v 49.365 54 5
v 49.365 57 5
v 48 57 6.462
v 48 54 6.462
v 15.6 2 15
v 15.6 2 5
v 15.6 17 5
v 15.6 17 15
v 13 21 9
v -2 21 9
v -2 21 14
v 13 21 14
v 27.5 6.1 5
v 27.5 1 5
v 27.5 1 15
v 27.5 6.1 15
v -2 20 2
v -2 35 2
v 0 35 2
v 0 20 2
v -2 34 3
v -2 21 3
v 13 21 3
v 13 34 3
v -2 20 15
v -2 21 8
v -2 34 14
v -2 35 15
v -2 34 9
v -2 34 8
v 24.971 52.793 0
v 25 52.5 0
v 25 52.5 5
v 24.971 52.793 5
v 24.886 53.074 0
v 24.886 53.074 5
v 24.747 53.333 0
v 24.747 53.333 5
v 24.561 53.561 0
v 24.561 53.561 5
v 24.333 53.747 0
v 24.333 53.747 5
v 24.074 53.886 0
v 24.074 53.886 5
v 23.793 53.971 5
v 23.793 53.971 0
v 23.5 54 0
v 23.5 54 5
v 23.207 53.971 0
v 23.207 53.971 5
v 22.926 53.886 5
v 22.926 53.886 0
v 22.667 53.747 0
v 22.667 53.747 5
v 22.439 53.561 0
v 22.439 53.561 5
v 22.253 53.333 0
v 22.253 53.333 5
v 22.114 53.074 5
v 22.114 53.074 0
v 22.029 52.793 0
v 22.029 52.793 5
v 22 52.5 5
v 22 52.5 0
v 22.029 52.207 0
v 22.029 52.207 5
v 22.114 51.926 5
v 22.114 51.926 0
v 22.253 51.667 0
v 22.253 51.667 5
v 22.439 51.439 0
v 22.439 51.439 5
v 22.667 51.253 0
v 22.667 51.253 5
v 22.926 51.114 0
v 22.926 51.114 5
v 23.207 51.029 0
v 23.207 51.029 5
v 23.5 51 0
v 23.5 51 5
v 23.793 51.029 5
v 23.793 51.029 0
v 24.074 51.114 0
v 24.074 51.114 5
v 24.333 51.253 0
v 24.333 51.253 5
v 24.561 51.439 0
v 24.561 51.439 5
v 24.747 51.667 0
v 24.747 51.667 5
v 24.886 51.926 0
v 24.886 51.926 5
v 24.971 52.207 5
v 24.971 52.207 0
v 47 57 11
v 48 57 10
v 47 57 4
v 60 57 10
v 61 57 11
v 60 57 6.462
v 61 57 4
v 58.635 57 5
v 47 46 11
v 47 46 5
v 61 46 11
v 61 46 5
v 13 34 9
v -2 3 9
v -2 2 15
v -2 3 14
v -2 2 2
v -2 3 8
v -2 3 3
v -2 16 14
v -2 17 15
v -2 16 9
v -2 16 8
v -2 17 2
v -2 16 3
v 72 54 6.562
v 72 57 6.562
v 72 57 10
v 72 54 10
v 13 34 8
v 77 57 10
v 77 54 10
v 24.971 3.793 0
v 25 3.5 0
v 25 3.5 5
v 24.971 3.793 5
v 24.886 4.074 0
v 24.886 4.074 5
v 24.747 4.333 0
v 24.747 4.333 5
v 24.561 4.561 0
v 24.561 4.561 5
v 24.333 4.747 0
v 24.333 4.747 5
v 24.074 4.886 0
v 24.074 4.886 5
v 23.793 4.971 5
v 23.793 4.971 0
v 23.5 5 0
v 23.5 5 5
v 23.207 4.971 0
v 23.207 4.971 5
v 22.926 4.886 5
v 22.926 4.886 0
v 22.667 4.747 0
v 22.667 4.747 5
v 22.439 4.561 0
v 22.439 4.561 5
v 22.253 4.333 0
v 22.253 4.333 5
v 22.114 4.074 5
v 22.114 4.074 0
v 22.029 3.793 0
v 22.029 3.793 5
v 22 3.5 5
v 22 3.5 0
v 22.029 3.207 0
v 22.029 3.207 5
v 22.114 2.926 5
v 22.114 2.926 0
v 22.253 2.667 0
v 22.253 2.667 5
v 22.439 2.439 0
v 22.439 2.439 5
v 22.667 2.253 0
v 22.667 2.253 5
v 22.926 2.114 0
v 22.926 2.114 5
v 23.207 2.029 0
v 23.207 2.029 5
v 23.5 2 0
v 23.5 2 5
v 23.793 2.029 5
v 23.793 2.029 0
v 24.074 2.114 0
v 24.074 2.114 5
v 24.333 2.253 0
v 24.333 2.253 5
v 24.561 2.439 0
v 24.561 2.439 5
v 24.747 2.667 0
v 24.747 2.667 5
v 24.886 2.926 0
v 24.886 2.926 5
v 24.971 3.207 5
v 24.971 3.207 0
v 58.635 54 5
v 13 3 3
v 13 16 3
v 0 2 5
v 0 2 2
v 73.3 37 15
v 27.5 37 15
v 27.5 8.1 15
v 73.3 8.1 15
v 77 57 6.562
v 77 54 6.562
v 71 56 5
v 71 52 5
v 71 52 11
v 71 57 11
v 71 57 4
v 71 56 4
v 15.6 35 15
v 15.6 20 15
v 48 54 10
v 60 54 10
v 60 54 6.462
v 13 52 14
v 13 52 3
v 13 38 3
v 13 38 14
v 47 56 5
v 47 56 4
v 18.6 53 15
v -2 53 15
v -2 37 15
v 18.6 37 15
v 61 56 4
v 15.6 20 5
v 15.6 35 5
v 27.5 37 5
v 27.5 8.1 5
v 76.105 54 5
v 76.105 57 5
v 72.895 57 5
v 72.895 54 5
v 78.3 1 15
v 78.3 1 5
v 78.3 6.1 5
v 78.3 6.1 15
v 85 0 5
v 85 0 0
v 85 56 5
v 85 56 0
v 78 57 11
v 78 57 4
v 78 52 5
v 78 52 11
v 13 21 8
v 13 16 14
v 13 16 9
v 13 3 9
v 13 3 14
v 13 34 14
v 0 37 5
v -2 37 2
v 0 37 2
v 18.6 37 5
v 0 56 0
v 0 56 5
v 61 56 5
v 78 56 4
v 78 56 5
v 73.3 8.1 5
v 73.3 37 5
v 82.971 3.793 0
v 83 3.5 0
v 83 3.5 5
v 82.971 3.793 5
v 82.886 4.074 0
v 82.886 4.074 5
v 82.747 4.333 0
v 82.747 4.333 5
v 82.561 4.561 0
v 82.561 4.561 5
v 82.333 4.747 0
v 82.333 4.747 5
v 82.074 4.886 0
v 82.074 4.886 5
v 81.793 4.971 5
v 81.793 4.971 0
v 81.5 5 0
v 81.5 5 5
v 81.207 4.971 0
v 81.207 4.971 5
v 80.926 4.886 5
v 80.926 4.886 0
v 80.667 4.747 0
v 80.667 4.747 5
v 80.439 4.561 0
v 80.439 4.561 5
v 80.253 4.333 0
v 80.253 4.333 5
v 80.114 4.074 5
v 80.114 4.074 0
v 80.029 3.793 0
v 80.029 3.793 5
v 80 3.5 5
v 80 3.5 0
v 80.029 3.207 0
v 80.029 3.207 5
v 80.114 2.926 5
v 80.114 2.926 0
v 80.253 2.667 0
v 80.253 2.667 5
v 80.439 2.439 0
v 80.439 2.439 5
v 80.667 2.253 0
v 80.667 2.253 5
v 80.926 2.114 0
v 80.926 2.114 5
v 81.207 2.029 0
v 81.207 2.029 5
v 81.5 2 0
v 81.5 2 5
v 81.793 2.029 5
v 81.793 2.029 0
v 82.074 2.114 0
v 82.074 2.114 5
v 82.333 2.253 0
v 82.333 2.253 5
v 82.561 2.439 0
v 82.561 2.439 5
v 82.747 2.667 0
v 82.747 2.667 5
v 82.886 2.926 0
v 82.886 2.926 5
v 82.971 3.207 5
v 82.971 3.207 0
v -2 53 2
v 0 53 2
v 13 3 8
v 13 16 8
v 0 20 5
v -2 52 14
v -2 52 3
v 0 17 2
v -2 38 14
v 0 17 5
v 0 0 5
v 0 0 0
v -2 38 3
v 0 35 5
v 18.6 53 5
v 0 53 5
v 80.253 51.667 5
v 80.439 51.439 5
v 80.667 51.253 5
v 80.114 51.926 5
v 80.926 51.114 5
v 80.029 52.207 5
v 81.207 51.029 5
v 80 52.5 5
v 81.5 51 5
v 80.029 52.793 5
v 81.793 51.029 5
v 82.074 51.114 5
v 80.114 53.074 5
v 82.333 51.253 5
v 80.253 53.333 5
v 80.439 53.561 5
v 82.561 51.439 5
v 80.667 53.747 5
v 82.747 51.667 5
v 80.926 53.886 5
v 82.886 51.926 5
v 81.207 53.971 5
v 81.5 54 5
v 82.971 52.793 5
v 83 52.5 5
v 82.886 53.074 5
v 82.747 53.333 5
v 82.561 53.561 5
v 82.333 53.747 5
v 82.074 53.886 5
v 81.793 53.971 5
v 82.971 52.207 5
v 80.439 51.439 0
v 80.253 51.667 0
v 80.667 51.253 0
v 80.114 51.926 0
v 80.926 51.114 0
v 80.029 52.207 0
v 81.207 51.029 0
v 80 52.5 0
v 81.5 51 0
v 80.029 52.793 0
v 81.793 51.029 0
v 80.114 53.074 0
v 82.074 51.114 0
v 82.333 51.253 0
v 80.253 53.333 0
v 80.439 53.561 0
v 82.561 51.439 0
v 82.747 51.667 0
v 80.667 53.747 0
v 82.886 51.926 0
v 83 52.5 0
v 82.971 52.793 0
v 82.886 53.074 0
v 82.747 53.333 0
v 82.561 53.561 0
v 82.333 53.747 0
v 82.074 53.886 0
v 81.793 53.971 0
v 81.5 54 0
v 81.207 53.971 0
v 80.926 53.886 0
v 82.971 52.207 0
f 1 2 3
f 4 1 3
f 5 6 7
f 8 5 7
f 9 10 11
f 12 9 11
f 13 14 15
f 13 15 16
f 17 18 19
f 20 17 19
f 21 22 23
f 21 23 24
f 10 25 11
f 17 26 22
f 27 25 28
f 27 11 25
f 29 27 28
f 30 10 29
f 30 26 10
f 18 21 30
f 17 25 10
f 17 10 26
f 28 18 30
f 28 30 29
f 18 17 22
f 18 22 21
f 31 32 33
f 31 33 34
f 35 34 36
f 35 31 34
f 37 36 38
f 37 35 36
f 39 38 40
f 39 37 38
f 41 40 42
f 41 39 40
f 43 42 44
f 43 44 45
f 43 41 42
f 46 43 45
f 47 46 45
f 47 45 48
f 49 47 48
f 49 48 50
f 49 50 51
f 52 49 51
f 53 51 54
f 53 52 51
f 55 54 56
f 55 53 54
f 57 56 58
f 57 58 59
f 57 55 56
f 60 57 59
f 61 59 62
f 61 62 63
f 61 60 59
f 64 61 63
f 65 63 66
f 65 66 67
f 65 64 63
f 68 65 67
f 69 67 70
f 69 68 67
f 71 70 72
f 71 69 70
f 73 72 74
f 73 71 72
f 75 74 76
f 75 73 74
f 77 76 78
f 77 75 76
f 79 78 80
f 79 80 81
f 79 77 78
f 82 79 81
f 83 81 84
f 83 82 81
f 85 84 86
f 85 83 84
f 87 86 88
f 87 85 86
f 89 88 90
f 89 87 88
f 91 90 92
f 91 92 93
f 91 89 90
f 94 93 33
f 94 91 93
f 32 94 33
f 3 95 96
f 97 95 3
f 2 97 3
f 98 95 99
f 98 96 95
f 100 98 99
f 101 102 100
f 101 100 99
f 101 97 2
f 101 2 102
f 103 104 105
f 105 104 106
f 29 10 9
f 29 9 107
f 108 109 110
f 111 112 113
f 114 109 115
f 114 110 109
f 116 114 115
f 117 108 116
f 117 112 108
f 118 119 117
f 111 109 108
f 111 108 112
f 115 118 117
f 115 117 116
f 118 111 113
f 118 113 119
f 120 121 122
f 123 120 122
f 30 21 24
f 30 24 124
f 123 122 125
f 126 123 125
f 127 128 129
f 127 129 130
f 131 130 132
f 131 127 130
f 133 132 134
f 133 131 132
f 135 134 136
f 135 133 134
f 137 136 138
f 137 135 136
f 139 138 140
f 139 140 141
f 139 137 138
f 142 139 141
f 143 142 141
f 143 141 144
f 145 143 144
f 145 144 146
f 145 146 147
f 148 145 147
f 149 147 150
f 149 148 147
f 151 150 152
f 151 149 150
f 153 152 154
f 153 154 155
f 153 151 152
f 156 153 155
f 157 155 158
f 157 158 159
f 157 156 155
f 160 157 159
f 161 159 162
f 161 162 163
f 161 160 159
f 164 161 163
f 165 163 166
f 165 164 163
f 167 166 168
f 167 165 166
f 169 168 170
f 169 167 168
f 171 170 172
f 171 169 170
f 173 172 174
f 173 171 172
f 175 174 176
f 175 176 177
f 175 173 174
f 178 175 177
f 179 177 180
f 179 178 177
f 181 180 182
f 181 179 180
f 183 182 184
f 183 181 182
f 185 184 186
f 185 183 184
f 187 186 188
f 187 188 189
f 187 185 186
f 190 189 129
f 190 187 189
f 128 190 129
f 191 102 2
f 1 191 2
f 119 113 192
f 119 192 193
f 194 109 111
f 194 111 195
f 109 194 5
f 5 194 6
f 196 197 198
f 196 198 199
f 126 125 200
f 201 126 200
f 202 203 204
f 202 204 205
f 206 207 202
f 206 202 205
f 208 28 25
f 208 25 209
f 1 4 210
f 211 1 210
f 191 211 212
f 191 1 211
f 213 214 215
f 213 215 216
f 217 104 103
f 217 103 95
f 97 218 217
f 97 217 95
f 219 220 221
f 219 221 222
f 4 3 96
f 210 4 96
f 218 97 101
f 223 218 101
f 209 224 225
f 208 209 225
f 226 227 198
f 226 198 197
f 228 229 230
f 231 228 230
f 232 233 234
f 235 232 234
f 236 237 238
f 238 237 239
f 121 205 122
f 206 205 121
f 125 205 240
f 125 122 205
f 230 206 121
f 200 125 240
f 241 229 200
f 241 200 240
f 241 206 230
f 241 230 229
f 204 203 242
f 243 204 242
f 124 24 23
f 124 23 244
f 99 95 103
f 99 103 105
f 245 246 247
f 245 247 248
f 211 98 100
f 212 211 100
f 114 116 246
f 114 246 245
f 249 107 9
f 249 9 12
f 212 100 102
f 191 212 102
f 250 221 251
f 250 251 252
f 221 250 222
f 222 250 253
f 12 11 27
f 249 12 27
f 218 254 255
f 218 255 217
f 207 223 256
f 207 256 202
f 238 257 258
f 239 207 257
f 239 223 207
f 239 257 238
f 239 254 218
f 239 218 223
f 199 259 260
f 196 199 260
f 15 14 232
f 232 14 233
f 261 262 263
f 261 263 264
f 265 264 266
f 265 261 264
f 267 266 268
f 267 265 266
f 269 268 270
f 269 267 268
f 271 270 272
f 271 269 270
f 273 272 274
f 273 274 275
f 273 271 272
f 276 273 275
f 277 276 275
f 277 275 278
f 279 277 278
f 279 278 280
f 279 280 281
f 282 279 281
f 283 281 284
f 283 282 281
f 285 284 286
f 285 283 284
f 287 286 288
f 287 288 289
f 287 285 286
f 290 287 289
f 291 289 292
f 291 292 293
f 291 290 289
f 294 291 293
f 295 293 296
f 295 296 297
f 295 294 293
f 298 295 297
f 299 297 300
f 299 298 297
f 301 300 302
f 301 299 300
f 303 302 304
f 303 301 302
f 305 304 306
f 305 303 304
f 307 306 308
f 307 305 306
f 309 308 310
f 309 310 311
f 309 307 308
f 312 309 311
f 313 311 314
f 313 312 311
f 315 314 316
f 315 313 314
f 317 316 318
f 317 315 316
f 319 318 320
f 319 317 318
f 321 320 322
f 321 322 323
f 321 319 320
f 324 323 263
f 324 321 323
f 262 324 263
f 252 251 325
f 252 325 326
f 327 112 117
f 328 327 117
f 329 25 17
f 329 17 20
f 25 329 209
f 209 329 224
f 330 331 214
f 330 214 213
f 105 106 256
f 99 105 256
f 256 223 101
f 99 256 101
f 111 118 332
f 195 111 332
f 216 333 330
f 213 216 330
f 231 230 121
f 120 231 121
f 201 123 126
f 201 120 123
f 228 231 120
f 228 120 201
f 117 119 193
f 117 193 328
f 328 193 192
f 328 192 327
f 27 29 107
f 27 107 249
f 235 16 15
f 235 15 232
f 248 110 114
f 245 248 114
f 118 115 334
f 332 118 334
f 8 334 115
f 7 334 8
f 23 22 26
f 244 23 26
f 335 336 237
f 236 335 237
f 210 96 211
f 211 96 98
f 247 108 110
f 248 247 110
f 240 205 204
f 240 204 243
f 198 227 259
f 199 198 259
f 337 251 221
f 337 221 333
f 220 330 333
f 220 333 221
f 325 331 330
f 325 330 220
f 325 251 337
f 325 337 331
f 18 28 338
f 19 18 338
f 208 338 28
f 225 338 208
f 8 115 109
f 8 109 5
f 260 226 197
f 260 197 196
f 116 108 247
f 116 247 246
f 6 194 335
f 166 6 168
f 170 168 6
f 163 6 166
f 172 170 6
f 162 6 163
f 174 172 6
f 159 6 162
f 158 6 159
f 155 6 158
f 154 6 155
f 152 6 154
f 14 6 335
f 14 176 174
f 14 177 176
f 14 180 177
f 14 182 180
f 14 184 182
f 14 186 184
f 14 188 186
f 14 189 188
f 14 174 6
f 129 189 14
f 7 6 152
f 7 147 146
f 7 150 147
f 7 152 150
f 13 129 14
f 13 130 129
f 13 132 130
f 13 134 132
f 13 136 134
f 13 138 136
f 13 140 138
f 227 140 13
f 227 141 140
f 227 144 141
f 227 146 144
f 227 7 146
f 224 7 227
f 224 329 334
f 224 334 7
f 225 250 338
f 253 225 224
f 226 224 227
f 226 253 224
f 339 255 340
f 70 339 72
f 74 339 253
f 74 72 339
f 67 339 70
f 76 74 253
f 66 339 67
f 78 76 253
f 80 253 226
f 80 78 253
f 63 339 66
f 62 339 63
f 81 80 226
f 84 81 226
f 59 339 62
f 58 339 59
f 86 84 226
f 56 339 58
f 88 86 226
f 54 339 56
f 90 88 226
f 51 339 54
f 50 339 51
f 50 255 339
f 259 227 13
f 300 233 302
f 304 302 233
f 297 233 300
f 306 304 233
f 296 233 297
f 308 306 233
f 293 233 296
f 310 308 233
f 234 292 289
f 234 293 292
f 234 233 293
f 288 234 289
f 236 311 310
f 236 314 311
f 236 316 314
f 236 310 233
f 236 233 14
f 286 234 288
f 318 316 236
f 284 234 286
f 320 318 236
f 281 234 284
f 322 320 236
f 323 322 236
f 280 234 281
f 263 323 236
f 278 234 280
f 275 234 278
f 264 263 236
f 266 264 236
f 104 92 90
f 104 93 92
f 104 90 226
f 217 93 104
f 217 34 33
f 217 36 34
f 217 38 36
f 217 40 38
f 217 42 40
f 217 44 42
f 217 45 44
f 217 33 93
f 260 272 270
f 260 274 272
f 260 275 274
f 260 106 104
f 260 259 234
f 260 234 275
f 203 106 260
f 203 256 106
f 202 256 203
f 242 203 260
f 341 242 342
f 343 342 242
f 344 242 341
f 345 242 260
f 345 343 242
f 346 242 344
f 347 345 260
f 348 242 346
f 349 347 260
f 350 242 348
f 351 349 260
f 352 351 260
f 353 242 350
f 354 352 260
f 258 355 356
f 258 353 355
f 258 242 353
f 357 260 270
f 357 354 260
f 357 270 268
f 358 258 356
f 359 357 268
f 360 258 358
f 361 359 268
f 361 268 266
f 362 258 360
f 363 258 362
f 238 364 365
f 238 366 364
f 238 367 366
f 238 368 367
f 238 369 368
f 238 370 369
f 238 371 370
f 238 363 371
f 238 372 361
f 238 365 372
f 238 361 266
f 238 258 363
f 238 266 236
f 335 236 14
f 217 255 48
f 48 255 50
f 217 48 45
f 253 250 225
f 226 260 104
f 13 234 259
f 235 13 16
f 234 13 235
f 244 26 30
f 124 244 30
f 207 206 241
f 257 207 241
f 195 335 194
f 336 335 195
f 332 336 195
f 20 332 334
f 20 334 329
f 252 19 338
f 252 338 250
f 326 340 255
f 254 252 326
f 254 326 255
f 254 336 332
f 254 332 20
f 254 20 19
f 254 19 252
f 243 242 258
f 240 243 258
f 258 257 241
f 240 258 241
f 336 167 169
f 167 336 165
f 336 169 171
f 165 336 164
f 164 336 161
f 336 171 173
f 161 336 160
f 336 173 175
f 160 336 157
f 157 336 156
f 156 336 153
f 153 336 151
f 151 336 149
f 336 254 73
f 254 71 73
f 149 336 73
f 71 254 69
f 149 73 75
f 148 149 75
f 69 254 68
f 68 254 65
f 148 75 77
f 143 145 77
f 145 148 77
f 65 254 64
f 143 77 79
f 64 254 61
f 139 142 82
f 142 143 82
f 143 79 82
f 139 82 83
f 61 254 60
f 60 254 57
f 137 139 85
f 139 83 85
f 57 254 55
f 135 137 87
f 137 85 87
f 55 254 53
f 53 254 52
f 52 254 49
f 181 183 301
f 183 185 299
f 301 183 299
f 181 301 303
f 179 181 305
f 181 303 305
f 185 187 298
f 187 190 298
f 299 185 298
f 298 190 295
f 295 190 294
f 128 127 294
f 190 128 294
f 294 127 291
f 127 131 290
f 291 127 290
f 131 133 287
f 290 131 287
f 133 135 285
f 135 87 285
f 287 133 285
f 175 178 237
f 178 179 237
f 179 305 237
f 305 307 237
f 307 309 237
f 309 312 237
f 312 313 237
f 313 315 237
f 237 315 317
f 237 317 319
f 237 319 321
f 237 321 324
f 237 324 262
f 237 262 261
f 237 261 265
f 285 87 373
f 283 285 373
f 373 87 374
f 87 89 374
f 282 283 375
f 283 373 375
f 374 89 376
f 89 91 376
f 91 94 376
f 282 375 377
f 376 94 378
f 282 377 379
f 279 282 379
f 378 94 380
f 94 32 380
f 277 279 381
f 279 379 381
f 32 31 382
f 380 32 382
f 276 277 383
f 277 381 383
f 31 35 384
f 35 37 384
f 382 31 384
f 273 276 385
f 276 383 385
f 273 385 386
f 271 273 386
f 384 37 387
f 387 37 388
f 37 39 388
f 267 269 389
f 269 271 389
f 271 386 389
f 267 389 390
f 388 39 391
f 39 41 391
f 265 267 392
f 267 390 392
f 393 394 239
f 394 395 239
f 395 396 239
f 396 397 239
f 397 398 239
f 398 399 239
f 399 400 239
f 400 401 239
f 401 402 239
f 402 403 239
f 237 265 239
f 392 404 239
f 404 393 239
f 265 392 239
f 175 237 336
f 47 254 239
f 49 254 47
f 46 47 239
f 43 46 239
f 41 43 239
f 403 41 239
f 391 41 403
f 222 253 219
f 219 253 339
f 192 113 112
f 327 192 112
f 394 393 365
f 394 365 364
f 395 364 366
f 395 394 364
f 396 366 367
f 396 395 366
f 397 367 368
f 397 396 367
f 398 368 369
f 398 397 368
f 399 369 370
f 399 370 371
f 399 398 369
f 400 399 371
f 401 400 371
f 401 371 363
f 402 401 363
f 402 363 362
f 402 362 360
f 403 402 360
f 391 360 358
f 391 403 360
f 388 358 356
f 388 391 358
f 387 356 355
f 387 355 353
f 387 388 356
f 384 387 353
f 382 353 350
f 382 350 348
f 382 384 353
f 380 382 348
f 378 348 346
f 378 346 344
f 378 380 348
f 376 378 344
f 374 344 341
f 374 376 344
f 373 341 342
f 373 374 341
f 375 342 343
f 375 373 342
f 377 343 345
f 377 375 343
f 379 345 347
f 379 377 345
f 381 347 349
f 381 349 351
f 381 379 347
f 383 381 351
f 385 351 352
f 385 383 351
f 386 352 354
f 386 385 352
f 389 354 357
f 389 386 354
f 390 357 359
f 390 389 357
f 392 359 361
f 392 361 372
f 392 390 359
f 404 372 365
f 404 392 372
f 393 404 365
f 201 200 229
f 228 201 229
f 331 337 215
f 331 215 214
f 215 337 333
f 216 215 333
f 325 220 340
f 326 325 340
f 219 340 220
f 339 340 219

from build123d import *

# Parameters (mm, degrees)
CROQUIS1_W                   = 85
CROQUIS1_H                   = 56
CROQUIS1_R                   = 1.5
SALIENTE_EXTRUIR3_DEPTH      = 5
SALIENTE_EXTRUIR4_DEPTH      = 10
SALIENTE_EXTRUIR4_DEPTH_BACK = 3
CROQUIS2_W                   = 20.6
CROQUIS2_H                   = 16
CROQUIS3_W                   = 50.8
CROQUIS3_H                   = 5.1
SALIENTE_EXTRUIR5_DEPTH      = 10
CROQUIS4_W                   = 11
CROQUIS4_H                   = 14
CORTAR_EXTRUIR2_DEPTH        = 15
CROQUIS5_W                   = 45.8
CROQUIS5_H                   = 28.9
SALIENTE_EXTRUIR6_DEPTH      = 10
SALIENTE_EXTRUIR8_DEPTH      = 10
SALIENTE_EXTRUIR8_DEPTH_BACK = 3
CROQUIS6_W                   = 17.6
CROQUIS6_H                   = 15
CROQUIS7_W                   = 5
CROQUIS7_H                   = 13
CORTAR_EXTRUIR3_DEPTH        = 15
SALIENTE_EXTRUIR9_DEPTH      = 6
SALIENTE_EXTRUIR9_DEPTH_BACK = 1
CROQUIS8_W                   = 7
CROQUIS8_H                   = 5
CROQUIS8_W_2                 = 14
CROQUIS8_H_2                 = 11
CORTAR_EXTRUIR4_DEPTH        = 3


with BuildPart() as part:
    # Croquis1 → Saliente-Extruir3 (new body)
    with BuildSketch(Plane.XY):
        with Locations((42.5, 28)):
            Rectangle(CROQUIS1_W, CROQUIS1_H)
        with Locations((23.5, 52.5)):
            Circle(CROQUIS1_R, mode=Mode.SUBTRACT)
        with Locations((23.5, 3.5)):
            Circle(CROQUIS1_R, mode=Mode.SUBTRACT)
        with Locations((81.5, 52.5)):
            Circle(CROQUIS1_R, mode=Mode.SUBTRACT)
        with Locations((81.5, 3.5)):
            Circle(CROQUIS1_R, mode=Mode.SUBTRACT)
    extrude(amount=SALIENTE_EXTRUIR3_DEPTH)

    # Croquis2 → Saliente-Extruir4 (add, two sides: drawn at the far end of the back side and taken through both)
    with BuildSketch(Plane.XY.offset(5).offset(-SALIENTE_EXTRUIR4_DEPTH_BACK)):
        with Locations((8.3, 45)):
            Rectangle(CROQUIS2_W, CROQUIS2_H)
    extrude(amount=SALIENTE_EXTRUIR4_DEPTH + SALIENTE_EXTRUIR4_DEPTH_BACK)

    # Croquis3 → Saliente-Extruir5 (add)
    with BuildSketch(Plane.XY.offset(5)):
        with Locations((52.9, 3.55)):
            Rectangle(CROQUIS3_W, CROQUIS3_H)
    extrude(amount=SALIENTE_EXTRUIR5_DEPTH)

    # Croquis4 → Cortar-Extruir2 (cut)
    with BuildSketch(Plane.ZY.offset(2)):
        with Locations((8.5, 45)):
            Rectangle(CROQUIS4_W, CROQUIS4_H)
    extrude(amount=-CORTAR_EXTRUIR2_DEPTH, mode=Mode.SUBTRACT)

    # Croquis5 → Saliente-Extruir6 (add)
    with BuildSketch(Plane.XY.offset(5)):
        with Locations((50.4, 22.55)):
            Rectangle(CROQUIS5_W, CROQUIS5_H)
    extrude(amount=SALIENTE_EXTRUIR6_DEPTH)

    # Croquis6 → Saliente-Extruir8 (add, two sides: drawn at the far end of the back side and taken through both)
    with BuildSketch(Plane.XY.offset(5).offset(-SALIENTE_EXTRUIR8_DEPTH_BACK)):
        with Locations((6.8, 27.5)):
            Rectangle(CROQUIS6_W, CROQUIS6_H)
        with Locations((6.8, 9.5)):
            Rectangle(CROQUIS6_W, CROQUIS6_H)
    extrude(amount=SALIENTE_EXTRUIR8_DEPTH + SALIENTE_EXTRUIR8_DEPTH_BACK)

    # Croquis7 → Cortar-Extruir3 (cut)
    with BuildSketch(Plane.ZY.offset(2)):
        with Locations((5.5, 27.5)):
            Rectangle(CROQUIS7_W, CROQUIS7_H)
        with Locations((11.5, 27.5)):
            Rectangle(CROQUIS7_W, CROQUIS7_H)
        with Locations((11.5, 9.5)):
            Rectangle(CROQUIS7_W, CROQUIS7_H)
        with Locations((5.5, 9.5)):
            Rectangle(CROQUIS7_W, CROQUIS7_H)
    extrude(amount=-CORTAR_EXTRUIR3_DEPTH, mode=Mode.SUBTRACT)

    # Croquis8 → Saliente-Extruir9 (add, two sides: drawn at the far end of the back side and taken through both)
    with BuildSketch(Plane.XY.offset(5).offset(-SALIENTE_EXTRUIR9_DEPTH_BACK)):
        with Locations((74.5, 54.5)):
            Rectangle(CROQUIS8_W, CROQUIS8_H)
        with Locations((54, 51.5)):
            Rectangle(CROQUIS8_W_2, CROQUIS8_H_2)
    extrude(amount=SALIENTE_EXTRUIR9_DEPTH + SALIENTE_EXTRUIR9_DEPTH_BACK)

    # Croquis9 → Cortar-Extruir4 (cut)
    with BuildSketch(Plane(origin=(0, 57, 0), x_dir=(1, 0, 0), z_dir=(0, 1, 0))):
        Polygon((48, -10), (60, -10), (60, -6.462110536), (58.635363499, -5), (49.364636501, -5), (48, -6.462110536), align=None)
        Polygon((72, -10), (77, -10), (77, -6.561817621), (76.105167212, -5), (72.894832788, -5), (72, -6.561817621), align=None)
    extrude(amount=-CORTAR_EXTRUIR4_DEPTH, mode=Mode.SUBTRACT)


solid = part.part
